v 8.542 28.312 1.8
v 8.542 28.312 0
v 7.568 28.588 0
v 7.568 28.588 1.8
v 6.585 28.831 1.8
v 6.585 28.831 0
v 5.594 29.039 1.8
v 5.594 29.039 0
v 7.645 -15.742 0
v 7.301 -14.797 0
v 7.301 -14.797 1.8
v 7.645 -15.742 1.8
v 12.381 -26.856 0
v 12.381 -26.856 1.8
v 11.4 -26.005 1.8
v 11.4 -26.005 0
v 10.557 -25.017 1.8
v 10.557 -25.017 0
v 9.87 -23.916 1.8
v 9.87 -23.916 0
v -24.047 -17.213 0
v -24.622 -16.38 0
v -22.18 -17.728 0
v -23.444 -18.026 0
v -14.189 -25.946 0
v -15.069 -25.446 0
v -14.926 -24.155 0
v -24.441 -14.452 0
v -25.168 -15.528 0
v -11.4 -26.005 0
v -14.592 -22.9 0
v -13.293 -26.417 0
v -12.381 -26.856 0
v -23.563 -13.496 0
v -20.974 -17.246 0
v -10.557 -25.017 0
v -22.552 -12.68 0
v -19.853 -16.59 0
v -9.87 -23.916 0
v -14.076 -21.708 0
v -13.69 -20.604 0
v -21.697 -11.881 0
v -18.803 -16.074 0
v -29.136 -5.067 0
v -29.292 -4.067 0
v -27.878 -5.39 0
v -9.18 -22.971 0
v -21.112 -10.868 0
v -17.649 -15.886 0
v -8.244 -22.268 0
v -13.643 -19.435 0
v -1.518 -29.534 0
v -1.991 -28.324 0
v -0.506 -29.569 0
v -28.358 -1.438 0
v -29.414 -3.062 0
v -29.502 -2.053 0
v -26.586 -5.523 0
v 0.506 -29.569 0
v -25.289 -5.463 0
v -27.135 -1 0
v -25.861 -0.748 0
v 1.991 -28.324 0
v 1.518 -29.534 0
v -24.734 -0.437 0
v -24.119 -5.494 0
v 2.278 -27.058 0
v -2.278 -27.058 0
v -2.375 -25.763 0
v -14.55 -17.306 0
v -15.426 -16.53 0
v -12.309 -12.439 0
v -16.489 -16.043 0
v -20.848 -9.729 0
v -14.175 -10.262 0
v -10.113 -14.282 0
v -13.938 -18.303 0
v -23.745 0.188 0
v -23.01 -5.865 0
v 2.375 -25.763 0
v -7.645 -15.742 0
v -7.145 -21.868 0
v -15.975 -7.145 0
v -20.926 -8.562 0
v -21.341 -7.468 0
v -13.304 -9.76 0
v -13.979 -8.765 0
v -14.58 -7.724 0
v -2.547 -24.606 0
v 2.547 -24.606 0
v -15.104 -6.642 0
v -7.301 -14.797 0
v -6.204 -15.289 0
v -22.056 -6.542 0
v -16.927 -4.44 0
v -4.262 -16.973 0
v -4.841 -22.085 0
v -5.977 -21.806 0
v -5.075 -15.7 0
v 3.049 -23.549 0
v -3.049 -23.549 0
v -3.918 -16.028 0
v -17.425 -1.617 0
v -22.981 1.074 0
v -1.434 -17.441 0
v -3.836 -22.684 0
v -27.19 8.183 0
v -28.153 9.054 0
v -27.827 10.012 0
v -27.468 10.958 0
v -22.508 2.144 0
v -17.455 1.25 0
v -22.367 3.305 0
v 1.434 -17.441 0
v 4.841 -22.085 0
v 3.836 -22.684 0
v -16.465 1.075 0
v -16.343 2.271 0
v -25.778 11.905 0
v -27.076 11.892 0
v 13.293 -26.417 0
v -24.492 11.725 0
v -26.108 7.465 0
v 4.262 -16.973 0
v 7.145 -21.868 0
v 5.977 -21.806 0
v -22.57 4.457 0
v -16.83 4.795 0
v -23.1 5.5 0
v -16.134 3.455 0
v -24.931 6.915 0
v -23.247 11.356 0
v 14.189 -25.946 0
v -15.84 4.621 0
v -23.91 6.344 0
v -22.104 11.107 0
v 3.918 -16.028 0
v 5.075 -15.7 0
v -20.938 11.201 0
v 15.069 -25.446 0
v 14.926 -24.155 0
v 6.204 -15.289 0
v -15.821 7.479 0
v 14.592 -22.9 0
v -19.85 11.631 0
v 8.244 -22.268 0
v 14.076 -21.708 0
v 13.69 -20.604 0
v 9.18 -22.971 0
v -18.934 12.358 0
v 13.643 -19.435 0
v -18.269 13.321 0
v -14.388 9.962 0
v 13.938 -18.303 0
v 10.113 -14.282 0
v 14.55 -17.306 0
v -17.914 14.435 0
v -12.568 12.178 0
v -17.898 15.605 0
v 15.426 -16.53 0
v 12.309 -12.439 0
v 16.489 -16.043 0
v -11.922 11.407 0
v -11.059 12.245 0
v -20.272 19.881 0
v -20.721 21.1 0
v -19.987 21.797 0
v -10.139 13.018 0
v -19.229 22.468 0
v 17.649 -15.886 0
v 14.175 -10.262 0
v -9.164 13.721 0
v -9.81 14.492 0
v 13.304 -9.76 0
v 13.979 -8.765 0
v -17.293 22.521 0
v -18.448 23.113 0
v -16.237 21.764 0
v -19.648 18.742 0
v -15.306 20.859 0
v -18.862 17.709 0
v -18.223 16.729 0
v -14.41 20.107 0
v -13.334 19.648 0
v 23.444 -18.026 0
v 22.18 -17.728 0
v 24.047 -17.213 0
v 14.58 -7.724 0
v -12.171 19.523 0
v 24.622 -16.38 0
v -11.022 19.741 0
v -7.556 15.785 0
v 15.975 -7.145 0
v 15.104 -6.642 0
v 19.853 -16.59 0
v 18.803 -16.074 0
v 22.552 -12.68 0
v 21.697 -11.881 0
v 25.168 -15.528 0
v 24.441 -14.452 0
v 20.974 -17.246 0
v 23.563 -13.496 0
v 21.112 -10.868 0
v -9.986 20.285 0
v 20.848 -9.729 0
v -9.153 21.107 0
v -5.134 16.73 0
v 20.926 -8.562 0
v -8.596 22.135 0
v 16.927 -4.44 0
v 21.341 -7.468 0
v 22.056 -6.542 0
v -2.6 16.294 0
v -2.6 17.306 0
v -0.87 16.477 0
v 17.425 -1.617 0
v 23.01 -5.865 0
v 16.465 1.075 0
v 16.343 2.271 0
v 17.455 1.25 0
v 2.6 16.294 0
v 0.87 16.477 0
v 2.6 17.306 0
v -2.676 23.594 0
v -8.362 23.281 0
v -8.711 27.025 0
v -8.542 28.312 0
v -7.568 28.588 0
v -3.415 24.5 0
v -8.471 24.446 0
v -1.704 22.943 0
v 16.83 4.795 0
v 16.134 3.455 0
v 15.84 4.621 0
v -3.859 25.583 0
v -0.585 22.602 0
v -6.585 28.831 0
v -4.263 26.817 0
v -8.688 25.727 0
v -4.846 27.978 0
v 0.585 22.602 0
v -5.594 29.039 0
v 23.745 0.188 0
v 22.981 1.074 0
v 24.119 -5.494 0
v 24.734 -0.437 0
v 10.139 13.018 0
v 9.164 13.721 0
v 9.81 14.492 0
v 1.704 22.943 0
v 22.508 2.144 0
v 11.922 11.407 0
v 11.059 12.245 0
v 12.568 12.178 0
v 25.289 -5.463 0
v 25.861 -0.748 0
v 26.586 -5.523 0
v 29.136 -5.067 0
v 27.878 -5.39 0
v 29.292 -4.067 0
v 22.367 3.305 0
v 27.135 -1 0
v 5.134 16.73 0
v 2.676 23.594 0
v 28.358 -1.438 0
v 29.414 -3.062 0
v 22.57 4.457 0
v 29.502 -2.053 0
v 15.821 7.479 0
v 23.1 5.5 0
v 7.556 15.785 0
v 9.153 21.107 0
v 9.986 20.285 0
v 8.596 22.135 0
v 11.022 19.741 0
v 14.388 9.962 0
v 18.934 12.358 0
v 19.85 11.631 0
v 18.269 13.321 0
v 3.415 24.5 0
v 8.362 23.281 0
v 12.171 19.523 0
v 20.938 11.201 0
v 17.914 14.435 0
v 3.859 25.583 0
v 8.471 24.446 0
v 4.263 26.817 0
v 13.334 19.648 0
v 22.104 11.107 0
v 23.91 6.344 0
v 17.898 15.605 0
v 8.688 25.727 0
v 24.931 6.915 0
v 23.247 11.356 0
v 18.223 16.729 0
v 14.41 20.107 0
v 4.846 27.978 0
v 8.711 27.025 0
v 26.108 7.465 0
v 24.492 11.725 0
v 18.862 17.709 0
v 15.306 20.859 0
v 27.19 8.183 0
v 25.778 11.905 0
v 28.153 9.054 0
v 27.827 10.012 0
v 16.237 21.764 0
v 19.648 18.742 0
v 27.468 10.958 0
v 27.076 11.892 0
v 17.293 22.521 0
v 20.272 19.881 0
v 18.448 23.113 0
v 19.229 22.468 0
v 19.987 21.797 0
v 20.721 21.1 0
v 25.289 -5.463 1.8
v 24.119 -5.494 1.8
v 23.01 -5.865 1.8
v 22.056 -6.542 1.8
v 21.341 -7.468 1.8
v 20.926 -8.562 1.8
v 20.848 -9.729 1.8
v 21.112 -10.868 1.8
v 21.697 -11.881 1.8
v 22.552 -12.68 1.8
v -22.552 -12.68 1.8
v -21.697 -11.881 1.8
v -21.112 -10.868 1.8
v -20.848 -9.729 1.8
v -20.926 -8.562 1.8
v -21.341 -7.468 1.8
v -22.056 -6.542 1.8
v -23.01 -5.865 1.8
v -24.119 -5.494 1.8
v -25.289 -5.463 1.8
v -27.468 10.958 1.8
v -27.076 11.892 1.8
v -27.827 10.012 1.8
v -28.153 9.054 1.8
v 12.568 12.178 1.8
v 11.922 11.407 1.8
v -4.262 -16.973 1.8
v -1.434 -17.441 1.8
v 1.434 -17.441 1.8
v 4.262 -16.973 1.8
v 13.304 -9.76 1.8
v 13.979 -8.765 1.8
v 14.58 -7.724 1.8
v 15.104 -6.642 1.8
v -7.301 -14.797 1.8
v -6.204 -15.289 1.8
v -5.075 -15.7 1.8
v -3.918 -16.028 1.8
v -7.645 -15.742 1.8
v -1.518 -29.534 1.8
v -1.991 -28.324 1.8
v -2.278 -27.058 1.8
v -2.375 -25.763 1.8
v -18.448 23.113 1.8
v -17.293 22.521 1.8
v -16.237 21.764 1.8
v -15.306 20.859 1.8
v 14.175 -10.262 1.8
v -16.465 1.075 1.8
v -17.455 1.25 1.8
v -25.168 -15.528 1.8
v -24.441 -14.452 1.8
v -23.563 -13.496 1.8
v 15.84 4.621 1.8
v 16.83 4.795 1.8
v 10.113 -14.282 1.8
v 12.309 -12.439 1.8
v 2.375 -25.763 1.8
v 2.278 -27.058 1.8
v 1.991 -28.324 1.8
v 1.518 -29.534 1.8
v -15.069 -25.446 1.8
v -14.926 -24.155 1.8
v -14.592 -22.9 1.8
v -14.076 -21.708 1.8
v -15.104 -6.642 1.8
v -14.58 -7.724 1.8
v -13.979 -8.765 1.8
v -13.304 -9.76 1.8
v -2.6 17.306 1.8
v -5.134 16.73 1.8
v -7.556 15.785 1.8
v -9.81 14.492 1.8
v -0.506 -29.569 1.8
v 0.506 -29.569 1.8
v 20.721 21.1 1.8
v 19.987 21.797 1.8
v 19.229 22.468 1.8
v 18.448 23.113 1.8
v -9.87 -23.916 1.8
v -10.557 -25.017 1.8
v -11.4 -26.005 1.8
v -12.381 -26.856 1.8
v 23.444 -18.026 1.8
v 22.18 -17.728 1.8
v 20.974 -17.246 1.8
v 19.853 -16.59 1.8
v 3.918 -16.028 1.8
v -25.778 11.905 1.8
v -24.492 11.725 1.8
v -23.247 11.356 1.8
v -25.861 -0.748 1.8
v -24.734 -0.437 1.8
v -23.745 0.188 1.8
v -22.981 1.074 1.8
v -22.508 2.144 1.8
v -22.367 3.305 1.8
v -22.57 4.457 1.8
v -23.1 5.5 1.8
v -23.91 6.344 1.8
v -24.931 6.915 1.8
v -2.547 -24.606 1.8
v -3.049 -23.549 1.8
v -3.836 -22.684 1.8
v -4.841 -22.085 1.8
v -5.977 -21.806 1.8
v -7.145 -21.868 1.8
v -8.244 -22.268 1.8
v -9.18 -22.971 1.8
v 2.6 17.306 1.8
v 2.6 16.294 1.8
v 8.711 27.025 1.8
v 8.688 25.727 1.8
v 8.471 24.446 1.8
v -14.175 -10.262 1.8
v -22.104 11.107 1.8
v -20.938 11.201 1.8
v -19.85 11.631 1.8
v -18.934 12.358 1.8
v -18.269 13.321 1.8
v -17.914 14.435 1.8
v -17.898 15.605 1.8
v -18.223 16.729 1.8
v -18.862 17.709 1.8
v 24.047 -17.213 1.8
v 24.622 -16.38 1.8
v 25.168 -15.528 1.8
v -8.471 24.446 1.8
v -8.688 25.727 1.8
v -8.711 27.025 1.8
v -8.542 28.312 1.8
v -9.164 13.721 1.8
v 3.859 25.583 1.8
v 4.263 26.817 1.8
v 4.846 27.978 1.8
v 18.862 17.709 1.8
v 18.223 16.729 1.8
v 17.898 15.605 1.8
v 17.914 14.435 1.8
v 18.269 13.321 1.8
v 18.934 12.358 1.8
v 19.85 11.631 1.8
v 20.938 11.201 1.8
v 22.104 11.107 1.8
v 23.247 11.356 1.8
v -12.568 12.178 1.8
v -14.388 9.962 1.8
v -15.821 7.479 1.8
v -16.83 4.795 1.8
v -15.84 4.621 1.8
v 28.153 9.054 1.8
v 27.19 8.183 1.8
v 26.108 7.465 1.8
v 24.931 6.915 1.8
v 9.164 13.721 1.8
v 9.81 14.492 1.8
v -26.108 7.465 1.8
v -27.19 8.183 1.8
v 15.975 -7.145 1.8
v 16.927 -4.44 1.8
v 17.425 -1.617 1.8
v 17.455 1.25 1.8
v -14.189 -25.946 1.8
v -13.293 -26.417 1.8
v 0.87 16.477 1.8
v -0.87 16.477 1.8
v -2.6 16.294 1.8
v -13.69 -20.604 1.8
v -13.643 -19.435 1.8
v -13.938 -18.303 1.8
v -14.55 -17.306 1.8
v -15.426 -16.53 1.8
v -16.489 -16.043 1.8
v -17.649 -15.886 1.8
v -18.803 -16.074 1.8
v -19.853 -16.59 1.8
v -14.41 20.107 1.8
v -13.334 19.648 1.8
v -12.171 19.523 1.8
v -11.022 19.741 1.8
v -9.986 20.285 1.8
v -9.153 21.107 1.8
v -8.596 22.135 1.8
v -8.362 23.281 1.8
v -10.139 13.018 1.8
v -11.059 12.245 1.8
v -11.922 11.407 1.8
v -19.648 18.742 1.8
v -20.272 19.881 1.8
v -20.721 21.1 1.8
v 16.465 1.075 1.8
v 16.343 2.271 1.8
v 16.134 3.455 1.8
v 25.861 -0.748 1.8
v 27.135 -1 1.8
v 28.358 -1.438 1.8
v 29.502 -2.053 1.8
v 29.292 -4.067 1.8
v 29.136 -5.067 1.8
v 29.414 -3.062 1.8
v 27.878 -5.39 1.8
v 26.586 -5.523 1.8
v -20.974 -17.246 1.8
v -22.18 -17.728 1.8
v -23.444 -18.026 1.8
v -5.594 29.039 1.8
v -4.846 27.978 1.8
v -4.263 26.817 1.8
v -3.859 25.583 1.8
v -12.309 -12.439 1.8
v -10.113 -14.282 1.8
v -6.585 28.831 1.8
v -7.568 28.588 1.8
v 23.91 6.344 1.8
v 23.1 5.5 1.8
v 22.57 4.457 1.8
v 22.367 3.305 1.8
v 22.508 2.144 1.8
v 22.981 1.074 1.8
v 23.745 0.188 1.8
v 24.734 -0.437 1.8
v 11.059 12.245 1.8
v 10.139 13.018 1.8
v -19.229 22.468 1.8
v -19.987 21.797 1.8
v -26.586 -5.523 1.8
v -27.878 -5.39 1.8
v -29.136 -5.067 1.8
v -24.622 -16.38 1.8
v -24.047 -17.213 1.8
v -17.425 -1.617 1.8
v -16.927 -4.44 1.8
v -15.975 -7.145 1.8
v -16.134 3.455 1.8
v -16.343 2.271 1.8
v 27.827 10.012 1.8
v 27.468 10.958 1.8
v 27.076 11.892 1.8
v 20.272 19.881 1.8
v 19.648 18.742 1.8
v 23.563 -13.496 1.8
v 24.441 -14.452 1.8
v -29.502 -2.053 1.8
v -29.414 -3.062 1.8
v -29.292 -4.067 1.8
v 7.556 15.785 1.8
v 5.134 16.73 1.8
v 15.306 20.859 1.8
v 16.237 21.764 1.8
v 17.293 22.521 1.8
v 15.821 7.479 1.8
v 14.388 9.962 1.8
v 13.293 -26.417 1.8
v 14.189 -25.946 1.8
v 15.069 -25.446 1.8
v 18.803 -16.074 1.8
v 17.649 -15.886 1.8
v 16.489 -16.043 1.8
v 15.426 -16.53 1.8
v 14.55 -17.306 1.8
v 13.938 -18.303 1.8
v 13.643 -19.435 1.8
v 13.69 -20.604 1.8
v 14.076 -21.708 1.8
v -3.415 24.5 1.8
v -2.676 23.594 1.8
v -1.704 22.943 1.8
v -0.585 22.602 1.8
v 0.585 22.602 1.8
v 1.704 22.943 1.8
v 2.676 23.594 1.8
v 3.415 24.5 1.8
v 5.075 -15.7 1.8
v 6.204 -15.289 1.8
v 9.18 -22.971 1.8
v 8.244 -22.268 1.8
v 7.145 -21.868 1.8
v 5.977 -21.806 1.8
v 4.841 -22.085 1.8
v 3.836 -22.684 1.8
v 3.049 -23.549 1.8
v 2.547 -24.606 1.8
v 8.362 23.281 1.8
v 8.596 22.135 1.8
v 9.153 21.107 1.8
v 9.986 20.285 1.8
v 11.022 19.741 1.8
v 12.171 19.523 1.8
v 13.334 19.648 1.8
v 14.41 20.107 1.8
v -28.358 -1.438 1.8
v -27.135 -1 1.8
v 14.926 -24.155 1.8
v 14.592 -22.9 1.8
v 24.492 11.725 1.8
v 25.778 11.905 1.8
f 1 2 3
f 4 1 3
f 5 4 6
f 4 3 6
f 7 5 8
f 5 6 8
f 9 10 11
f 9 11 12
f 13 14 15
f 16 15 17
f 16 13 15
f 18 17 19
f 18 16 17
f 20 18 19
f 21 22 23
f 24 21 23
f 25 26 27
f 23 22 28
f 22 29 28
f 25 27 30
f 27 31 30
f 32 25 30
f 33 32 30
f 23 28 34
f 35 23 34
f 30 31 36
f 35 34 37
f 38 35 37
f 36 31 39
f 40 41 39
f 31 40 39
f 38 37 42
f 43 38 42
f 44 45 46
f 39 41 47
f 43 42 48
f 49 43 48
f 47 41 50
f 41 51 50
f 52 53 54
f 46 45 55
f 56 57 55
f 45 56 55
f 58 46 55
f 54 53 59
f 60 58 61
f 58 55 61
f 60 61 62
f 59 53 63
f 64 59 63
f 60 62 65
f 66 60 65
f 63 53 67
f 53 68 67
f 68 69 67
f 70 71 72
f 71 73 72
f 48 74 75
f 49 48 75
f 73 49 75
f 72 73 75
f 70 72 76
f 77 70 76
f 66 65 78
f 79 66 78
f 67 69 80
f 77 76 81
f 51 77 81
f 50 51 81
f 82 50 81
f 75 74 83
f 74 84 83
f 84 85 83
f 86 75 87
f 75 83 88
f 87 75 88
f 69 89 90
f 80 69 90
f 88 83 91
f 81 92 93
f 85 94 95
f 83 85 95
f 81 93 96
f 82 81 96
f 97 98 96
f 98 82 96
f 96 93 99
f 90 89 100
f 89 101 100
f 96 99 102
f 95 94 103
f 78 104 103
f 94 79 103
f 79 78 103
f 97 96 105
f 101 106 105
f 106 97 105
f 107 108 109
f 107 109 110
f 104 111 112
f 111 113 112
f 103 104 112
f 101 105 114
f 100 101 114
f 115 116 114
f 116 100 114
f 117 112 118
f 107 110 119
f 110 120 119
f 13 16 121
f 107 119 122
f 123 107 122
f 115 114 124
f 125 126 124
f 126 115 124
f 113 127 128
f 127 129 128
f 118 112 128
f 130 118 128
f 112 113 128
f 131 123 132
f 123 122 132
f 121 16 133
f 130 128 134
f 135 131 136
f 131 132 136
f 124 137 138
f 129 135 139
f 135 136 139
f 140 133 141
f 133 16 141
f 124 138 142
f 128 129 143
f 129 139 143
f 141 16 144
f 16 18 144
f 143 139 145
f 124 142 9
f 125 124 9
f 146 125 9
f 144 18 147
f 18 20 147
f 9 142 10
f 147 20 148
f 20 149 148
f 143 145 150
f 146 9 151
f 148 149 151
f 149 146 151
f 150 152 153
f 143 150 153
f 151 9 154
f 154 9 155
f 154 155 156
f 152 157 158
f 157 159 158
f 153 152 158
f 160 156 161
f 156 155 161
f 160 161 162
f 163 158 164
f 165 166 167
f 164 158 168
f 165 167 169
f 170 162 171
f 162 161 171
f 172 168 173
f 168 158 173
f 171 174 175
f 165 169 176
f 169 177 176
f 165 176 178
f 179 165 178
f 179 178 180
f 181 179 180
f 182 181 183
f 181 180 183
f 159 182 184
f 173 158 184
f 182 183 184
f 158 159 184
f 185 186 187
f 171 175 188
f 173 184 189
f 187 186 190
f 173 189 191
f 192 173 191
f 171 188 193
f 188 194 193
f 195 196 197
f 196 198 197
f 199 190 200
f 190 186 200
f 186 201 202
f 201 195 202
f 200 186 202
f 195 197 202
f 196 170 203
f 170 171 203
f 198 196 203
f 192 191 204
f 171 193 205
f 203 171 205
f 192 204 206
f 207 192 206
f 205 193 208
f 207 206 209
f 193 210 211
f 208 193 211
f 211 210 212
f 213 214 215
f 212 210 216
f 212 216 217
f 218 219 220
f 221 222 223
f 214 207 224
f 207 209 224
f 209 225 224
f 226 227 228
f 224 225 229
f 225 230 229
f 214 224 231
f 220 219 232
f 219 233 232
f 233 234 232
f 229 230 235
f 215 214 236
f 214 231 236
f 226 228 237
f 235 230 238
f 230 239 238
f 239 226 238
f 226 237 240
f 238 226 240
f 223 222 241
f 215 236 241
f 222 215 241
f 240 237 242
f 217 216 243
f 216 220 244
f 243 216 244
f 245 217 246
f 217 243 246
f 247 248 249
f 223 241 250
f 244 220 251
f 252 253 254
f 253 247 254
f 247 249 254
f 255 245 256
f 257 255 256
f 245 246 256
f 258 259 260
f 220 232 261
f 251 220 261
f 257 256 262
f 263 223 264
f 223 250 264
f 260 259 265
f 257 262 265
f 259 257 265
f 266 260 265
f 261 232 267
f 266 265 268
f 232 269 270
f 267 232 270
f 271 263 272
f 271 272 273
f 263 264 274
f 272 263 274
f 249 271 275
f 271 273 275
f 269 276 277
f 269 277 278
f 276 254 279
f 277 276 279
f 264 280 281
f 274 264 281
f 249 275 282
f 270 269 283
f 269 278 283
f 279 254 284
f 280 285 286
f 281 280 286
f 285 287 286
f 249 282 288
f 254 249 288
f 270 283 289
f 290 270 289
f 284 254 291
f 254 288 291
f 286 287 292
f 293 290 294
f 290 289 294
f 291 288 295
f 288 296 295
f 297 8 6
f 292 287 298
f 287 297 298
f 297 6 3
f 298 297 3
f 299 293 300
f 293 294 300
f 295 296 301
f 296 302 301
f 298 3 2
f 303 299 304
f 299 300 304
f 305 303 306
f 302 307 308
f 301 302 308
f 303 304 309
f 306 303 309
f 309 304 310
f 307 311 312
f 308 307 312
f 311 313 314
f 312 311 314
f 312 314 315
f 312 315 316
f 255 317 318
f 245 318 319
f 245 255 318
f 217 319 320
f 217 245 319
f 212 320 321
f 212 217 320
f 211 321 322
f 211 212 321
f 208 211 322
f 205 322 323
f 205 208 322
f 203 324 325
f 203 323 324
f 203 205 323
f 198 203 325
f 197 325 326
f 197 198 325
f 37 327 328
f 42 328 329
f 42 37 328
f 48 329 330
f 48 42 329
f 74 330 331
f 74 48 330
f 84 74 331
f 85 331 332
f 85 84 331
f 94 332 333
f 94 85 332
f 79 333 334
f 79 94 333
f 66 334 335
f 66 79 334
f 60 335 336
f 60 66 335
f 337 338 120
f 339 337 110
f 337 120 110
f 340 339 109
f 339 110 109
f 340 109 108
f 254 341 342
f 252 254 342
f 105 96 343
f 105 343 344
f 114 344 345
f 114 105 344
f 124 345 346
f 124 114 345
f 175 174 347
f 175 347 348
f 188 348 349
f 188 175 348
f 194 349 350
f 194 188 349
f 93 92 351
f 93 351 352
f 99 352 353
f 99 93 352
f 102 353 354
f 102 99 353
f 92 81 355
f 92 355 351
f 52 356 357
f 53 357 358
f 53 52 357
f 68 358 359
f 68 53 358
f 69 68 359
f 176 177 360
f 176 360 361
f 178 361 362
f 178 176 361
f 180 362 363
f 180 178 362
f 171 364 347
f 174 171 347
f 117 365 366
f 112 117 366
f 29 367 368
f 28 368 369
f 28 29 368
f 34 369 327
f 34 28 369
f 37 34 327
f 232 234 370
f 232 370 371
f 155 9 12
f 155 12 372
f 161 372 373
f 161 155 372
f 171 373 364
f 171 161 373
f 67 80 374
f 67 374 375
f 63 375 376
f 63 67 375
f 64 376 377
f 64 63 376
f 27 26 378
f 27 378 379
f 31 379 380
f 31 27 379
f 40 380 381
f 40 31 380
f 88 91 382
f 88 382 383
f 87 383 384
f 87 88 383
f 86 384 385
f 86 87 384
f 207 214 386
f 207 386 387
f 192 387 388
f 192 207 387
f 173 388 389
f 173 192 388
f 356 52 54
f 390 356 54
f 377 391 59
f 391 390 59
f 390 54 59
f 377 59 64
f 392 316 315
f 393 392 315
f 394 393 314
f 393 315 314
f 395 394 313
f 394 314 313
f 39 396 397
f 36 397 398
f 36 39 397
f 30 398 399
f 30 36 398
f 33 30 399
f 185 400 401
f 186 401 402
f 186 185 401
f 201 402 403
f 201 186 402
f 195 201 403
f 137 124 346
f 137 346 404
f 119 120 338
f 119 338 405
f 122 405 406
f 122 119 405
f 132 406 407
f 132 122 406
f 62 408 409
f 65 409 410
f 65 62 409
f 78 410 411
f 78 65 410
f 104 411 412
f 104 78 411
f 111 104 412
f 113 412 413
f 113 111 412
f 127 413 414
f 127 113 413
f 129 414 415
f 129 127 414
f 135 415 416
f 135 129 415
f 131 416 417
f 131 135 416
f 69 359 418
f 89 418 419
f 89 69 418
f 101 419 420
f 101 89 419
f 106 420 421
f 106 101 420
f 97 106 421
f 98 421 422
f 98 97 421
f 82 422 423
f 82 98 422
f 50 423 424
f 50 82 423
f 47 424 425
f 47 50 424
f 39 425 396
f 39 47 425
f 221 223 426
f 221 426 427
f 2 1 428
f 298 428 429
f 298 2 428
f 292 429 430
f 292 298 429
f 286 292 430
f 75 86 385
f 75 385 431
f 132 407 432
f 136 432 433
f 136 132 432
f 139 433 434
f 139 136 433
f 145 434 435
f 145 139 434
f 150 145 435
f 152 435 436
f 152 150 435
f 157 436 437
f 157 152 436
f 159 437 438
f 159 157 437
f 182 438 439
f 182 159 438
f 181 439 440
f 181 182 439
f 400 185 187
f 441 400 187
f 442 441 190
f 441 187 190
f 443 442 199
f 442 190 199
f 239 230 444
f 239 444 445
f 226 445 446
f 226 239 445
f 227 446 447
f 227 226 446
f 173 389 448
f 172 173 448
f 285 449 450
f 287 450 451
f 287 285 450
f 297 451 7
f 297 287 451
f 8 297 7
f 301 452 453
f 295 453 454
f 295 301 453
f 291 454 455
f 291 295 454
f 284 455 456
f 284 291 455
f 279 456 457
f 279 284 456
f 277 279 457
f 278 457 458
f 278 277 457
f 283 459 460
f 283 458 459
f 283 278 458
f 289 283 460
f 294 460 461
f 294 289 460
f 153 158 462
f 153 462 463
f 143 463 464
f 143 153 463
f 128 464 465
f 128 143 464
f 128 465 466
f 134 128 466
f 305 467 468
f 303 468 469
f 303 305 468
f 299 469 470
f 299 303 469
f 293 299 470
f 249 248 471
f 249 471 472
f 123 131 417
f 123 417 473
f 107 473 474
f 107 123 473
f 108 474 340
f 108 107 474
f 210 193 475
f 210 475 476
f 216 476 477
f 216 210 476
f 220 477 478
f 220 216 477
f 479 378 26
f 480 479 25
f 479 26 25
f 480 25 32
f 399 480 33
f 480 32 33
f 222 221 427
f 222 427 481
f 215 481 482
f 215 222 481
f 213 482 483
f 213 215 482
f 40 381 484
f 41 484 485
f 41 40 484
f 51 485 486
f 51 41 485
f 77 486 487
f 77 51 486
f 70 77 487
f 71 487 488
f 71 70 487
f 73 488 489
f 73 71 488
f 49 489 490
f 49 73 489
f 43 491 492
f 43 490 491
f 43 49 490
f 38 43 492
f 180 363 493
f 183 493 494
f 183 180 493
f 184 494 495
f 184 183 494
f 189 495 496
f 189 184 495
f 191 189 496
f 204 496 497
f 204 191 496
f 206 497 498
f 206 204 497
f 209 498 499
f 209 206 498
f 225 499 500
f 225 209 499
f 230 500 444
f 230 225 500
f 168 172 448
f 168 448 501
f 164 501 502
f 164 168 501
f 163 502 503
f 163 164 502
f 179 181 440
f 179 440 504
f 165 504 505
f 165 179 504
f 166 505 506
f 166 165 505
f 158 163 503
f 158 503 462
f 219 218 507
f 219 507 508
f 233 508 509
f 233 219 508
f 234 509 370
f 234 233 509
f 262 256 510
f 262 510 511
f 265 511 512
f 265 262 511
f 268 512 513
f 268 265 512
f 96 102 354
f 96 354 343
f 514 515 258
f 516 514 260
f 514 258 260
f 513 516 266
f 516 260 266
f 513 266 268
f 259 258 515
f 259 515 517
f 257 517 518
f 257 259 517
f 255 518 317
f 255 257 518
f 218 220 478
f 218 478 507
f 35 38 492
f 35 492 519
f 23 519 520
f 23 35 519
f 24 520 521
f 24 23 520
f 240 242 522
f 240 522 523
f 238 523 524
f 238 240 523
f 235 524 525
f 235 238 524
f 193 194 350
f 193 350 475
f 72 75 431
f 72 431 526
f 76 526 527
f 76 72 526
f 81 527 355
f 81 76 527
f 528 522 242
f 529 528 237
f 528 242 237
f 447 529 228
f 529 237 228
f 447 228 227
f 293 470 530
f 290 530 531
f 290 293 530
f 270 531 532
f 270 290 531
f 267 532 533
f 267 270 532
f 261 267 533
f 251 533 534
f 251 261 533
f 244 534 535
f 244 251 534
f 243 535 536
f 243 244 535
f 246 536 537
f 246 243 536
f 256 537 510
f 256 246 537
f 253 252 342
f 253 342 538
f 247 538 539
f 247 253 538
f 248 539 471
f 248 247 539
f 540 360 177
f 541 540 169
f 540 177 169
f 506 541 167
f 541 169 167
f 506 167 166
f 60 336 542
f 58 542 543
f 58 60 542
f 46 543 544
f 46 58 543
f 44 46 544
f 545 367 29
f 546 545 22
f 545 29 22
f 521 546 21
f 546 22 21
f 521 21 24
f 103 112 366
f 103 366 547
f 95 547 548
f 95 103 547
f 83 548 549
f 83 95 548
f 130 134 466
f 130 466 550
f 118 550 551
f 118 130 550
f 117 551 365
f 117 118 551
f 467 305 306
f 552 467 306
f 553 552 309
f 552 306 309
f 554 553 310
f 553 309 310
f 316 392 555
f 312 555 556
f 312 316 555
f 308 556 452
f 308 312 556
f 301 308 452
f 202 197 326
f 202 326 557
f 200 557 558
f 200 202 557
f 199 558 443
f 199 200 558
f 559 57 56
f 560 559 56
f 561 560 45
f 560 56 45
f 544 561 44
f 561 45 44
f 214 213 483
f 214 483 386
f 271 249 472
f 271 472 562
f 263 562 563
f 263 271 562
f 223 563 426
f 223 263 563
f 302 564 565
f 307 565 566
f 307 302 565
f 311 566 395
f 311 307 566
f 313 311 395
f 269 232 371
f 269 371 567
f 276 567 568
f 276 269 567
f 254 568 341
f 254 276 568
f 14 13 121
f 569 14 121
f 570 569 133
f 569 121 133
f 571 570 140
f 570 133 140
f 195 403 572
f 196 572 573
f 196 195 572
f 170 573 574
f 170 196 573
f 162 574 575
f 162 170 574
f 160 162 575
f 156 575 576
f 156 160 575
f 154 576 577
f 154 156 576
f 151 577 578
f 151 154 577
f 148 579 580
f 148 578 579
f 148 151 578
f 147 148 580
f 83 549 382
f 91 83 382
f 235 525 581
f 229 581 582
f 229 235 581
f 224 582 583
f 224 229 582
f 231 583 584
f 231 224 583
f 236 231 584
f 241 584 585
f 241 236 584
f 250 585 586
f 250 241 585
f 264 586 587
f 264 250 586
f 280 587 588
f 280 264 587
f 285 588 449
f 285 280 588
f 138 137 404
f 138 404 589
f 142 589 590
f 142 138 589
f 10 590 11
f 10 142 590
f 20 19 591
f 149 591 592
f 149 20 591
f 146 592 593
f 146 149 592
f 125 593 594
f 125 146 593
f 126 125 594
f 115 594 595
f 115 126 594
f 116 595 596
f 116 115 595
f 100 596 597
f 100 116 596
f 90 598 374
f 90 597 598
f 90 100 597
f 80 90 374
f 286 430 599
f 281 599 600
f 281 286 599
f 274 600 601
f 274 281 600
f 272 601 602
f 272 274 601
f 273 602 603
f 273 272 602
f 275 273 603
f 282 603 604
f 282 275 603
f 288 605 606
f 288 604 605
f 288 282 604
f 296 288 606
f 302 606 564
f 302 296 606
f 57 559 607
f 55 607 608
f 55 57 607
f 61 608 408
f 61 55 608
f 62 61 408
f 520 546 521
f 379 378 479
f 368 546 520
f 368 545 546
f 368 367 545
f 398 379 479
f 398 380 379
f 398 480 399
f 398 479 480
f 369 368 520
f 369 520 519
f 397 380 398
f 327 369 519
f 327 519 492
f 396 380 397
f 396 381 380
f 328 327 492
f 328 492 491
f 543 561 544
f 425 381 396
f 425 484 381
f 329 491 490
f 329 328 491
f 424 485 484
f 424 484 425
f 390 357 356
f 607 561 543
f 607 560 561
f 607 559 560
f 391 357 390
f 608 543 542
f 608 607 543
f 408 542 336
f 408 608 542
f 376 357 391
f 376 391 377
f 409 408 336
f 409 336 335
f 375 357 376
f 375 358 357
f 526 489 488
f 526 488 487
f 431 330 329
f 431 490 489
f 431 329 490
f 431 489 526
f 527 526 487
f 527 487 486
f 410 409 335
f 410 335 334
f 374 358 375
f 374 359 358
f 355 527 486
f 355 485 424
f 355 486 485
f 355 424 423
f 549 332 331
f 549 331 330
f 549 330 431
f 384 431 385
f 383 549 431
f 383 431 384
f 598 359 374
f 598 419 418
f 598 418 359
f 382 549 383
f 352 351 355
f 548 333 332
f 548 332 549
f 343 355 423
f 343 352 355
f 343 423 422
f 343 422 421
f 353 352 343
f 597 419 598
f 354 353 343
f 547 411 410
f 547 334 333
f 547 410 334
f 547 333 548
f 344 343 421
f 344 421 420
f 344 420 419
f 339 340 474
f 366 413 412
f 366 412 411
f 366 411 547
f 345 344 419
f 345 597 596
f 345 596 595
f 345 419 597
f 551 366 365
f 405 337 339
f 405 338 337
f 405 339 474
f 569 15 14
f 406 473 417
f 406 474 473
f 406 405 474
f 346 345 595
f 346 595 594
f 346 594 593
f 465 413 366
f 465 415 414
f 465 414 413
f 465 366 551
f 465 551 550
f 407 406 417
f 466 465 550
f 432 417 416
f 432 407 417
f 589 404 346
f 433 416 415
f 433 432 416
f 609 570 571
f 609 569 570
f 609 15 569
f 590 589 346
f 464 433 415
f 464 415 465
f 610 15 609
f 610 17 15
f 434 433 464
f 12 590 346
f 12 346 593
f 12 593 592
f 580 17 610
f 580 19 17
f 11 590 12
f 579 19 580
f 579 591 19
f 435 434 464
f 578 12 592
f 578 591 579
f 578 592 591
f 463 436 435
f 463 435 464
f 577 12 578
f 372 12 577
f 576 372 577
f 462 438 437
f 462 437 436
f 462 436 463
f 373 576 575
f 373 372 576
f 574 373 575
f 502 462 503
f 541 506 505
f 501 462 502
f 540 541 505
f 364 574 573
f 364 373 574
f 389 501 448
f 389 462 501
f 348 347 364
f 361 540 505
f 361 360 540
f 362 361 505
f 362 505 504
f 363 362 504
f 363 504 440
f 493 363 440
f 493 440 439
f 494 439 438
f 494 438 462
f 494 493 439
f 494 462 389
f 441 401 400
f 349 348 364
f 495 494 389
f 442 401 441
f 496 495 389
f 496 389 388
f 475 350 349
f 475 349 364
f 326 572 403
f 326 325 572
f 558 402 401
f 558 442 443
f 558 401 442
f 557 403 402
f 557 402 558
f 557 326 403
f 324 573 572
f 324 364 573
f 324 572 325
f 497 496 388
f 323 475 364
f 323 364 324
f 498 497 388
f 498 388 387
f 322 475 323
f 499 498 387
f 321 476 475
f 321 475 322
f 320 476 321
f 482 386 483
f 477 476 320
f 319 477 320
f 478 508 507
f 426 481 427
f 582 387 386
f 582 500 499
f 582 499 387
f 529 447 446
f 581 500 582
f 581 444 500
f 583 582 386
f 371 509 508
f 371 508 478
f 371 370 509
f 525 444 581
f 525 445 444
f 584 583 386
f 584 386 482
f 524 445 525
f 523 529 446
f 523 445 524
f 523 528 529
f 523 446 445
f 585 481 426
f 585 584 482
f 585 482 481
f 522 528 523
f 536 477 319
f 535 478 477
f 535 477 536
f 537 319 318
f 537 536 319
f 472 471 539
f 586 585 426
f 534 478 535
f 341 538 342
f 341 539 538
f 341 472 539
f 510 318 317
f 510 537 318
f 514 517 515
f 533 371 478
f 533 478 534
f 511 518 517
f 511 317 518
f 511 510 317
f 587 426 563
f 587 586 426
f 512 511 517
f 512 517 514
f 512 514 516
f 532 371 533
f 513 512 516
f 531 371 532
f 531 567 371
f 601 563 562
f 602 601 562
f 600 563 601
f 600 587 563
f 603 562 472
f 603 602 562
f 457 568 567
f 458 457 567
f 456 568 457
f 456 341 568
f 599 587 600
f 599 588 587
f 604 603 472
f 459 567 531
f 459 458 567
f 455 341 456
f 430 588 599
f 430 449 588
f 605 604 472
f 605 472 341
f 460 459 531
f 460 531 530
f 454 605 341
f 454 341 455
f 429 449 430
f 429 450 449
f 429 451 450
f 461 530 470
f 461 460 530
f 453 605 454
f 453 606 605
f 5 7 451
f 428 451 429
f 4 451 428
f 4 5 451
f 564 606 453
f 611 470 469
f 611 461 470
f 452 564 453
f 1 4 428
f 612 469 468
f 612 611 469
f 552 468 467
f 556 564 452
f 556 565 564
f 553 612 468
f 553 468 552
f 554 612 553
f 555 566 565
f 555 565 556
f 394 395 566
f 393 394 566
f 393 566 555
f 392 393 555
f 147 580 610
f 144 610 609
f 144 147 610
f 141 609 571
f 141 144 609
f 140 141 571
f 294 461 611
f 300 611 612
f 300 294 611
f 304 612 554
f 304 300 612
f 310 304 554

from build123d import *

# Parameters (mm, degrees)
SK_DISCO_R           = 29.572962734
DISCO_DEPTH          = 1.8
HUECO_DIENTE_DEPTH   = 42.861202201
MATRIZ_DIENTES_COUNT = 13


with BuildPart() as part:
    # Sk_Disco → Disco (new body)
    with BuildSketch(Plane.XY):
        Circle(SK_DISCO_R)
        with BuildLine():
            Line((2.6, 17.305779381), (2.6, 16.293863876))
            ThreePointArc((2.6, 16.293863876), (0, 16.5), (-2.6, 16.293863876))
            Line((-2.6, 16.293863876), (-2.6, 17.305779381))
            ThreePointArc((-2.6, 17.305779381), (-6.362648192, 16.302352836), (-9.810241185, 14.491693065))
            Line((-9.810241185, 14.491693065), (-9.163816615, 13.721314261))
            ThreePointArc((-9.163816615, 13.721314261), (-10.60599556, 12.639733311), (-11.92157661, 11.407278866))
            Line((-11.92157661, 11.407278866), (-12.56800118, 12.17765767))
            ThreePointArc((-12.56800118, 12.17765767), (-15.155444566, 8.75), (-16.830161491, 4.795379462))
            Line((-16.830161491, 4.795379462), (-15.839781591, 4.620748764))
            ThreePointArc((-15.839781591, 4.620748764), (-16.249327925, 2.865194932), (-16.464915031, 1.075440854))
            Line((-16.464915031, 1.075440854), (-17.455294931, 1.250071551))
            ThreePointArc((-17.455294931, 1.250071551), (-17.234135678, -3.038843109), (-15.975062189, -7.144745486))
            Line((-15.975062189, -7.144745486), (-15.104136721, -6.641916433))
            ThreePointArc((-15.104136721, -6.641916433), (-14.289419162, -8.25), (-13.304136721, -9.759607887))
            Line((-13.304136721, -9.759607887), (-14.175062189, -10.26243694))
            ThreePointArc((-14.175062189, -10.26243694), (-11.24878317, -13.405777755), (-7.645053746, -15.741764616))
            Line((-7.645053746, -15.741764616), (-7.301098416, -14.796755115))
            ThreePointArc((-7.301098416, -14.796755115), (-5.643332365, -15.504928243), (-3.918204981, -16.028027631))
            Line((-3.918204981, -16.028027631), (-4.262160311, -16.973037132))
            ThreePointArc((-4.262160311, -16.973037132), (0, -17.5), (4.262160311, -16.973037132))
            Line((4.262160311, -16.973037132), (3.918204981, -16.028027631))
            ThreePointArc((3.918204981, -16.028027631), (5.643332365, -15.504928243), (7.301098416, -14.796755115))
            Line((7.301098416, -14.796755115), (7.645053746, -15.741764616))
            ThreePointArc((7.645053746, -15.741764616), (11.24878317, -13.405777755), (14.175062189, -10.26243694))
            Line((14.175062189, -10.26243694), (13.304136721, -9.759607887))
            ThreePointArc((13.304136721, -9.759607887), (14.289419162, -8.25), (15.104136721, -6.641916433))
            Line((15.104136721, -6.641916433), (15.975062189, -7.144745486))
            ThreePointArc((15.975062189, -7.144745486), (17.234135678, -3.038843109), (17.455294931, 1.250071551))
            Line((17.455294931, 1.250071551), (16.464915031, 1.075440854))
            ThreePointArc((16.464915031, 1.075440854), (16.249327925, 2.865194932), (15.839781591, 4.620748764))
            Line((15.839781591, 4.620748764), (16.830161491, 4.795379462))
            ThreePointArc((16.830161491, 4.795379462), (15.155444566, 8.75), (12.56800118, 12.17765767))
            Line((12.56800118, 12.17765767), (11.92157661, 11.407278866))
            ThreePointArc((11.92157661, 11.407278866), (10.60599556, 12.639733311), (9.163816615, 13.721314261))
            Line((9.163816615, 13.721314261), (9.810241185, 14.491693065))
            ThreePointArc((9.810241185, 14.491693065), (6.362648192, 16.302352836), (2.6, 17.305779381))
        make_face(mode=Mode.SUBTRACT)
    extrude(amount=DISCO_DEPTH)

    # Sk_Hueco → Hueco_diente (cut, through all)
    with BuildSketch(Plane.XY):
        with BuildLine():
            ThreePointArc((-3.859493724, 25.582712562), (0, 22.558992327), (3.859493724, 25.582712562))
            ThreePointArc((3.859493724, 25.582712562), (5.159504407, 28.464173723), (7.400896702, 30.693300634))
            ThreePointArc((7.400896702, 30.693300634), (0, 31.572962734), (-7.400896702, 30.693300634))
            ThreePointArc((-7.400896702, 30.693300634), (-5.159504407, 28.464173723), (-3.859493724, 25.582712562))
        make_face()
    hueco_diente = extrude(amount=HUECO_DIENTE_DEPTH, mode=Mode.SUBTRACT)

    # Matriz_dientes: Hueco_diente ×13 about axis
    matriz_dientes_axis = Axis((0, 0, -0.09), (0, 0, 1))
    for i in range(1, MATRIZ_DIENTES_COUNT):
        add(hueco_diente.rotate(matriz_dientes_axis, i * 360 / MATRIZ_DIENTES_COUNT), mode=Mode.SUBTRACT)


solid = part.part
